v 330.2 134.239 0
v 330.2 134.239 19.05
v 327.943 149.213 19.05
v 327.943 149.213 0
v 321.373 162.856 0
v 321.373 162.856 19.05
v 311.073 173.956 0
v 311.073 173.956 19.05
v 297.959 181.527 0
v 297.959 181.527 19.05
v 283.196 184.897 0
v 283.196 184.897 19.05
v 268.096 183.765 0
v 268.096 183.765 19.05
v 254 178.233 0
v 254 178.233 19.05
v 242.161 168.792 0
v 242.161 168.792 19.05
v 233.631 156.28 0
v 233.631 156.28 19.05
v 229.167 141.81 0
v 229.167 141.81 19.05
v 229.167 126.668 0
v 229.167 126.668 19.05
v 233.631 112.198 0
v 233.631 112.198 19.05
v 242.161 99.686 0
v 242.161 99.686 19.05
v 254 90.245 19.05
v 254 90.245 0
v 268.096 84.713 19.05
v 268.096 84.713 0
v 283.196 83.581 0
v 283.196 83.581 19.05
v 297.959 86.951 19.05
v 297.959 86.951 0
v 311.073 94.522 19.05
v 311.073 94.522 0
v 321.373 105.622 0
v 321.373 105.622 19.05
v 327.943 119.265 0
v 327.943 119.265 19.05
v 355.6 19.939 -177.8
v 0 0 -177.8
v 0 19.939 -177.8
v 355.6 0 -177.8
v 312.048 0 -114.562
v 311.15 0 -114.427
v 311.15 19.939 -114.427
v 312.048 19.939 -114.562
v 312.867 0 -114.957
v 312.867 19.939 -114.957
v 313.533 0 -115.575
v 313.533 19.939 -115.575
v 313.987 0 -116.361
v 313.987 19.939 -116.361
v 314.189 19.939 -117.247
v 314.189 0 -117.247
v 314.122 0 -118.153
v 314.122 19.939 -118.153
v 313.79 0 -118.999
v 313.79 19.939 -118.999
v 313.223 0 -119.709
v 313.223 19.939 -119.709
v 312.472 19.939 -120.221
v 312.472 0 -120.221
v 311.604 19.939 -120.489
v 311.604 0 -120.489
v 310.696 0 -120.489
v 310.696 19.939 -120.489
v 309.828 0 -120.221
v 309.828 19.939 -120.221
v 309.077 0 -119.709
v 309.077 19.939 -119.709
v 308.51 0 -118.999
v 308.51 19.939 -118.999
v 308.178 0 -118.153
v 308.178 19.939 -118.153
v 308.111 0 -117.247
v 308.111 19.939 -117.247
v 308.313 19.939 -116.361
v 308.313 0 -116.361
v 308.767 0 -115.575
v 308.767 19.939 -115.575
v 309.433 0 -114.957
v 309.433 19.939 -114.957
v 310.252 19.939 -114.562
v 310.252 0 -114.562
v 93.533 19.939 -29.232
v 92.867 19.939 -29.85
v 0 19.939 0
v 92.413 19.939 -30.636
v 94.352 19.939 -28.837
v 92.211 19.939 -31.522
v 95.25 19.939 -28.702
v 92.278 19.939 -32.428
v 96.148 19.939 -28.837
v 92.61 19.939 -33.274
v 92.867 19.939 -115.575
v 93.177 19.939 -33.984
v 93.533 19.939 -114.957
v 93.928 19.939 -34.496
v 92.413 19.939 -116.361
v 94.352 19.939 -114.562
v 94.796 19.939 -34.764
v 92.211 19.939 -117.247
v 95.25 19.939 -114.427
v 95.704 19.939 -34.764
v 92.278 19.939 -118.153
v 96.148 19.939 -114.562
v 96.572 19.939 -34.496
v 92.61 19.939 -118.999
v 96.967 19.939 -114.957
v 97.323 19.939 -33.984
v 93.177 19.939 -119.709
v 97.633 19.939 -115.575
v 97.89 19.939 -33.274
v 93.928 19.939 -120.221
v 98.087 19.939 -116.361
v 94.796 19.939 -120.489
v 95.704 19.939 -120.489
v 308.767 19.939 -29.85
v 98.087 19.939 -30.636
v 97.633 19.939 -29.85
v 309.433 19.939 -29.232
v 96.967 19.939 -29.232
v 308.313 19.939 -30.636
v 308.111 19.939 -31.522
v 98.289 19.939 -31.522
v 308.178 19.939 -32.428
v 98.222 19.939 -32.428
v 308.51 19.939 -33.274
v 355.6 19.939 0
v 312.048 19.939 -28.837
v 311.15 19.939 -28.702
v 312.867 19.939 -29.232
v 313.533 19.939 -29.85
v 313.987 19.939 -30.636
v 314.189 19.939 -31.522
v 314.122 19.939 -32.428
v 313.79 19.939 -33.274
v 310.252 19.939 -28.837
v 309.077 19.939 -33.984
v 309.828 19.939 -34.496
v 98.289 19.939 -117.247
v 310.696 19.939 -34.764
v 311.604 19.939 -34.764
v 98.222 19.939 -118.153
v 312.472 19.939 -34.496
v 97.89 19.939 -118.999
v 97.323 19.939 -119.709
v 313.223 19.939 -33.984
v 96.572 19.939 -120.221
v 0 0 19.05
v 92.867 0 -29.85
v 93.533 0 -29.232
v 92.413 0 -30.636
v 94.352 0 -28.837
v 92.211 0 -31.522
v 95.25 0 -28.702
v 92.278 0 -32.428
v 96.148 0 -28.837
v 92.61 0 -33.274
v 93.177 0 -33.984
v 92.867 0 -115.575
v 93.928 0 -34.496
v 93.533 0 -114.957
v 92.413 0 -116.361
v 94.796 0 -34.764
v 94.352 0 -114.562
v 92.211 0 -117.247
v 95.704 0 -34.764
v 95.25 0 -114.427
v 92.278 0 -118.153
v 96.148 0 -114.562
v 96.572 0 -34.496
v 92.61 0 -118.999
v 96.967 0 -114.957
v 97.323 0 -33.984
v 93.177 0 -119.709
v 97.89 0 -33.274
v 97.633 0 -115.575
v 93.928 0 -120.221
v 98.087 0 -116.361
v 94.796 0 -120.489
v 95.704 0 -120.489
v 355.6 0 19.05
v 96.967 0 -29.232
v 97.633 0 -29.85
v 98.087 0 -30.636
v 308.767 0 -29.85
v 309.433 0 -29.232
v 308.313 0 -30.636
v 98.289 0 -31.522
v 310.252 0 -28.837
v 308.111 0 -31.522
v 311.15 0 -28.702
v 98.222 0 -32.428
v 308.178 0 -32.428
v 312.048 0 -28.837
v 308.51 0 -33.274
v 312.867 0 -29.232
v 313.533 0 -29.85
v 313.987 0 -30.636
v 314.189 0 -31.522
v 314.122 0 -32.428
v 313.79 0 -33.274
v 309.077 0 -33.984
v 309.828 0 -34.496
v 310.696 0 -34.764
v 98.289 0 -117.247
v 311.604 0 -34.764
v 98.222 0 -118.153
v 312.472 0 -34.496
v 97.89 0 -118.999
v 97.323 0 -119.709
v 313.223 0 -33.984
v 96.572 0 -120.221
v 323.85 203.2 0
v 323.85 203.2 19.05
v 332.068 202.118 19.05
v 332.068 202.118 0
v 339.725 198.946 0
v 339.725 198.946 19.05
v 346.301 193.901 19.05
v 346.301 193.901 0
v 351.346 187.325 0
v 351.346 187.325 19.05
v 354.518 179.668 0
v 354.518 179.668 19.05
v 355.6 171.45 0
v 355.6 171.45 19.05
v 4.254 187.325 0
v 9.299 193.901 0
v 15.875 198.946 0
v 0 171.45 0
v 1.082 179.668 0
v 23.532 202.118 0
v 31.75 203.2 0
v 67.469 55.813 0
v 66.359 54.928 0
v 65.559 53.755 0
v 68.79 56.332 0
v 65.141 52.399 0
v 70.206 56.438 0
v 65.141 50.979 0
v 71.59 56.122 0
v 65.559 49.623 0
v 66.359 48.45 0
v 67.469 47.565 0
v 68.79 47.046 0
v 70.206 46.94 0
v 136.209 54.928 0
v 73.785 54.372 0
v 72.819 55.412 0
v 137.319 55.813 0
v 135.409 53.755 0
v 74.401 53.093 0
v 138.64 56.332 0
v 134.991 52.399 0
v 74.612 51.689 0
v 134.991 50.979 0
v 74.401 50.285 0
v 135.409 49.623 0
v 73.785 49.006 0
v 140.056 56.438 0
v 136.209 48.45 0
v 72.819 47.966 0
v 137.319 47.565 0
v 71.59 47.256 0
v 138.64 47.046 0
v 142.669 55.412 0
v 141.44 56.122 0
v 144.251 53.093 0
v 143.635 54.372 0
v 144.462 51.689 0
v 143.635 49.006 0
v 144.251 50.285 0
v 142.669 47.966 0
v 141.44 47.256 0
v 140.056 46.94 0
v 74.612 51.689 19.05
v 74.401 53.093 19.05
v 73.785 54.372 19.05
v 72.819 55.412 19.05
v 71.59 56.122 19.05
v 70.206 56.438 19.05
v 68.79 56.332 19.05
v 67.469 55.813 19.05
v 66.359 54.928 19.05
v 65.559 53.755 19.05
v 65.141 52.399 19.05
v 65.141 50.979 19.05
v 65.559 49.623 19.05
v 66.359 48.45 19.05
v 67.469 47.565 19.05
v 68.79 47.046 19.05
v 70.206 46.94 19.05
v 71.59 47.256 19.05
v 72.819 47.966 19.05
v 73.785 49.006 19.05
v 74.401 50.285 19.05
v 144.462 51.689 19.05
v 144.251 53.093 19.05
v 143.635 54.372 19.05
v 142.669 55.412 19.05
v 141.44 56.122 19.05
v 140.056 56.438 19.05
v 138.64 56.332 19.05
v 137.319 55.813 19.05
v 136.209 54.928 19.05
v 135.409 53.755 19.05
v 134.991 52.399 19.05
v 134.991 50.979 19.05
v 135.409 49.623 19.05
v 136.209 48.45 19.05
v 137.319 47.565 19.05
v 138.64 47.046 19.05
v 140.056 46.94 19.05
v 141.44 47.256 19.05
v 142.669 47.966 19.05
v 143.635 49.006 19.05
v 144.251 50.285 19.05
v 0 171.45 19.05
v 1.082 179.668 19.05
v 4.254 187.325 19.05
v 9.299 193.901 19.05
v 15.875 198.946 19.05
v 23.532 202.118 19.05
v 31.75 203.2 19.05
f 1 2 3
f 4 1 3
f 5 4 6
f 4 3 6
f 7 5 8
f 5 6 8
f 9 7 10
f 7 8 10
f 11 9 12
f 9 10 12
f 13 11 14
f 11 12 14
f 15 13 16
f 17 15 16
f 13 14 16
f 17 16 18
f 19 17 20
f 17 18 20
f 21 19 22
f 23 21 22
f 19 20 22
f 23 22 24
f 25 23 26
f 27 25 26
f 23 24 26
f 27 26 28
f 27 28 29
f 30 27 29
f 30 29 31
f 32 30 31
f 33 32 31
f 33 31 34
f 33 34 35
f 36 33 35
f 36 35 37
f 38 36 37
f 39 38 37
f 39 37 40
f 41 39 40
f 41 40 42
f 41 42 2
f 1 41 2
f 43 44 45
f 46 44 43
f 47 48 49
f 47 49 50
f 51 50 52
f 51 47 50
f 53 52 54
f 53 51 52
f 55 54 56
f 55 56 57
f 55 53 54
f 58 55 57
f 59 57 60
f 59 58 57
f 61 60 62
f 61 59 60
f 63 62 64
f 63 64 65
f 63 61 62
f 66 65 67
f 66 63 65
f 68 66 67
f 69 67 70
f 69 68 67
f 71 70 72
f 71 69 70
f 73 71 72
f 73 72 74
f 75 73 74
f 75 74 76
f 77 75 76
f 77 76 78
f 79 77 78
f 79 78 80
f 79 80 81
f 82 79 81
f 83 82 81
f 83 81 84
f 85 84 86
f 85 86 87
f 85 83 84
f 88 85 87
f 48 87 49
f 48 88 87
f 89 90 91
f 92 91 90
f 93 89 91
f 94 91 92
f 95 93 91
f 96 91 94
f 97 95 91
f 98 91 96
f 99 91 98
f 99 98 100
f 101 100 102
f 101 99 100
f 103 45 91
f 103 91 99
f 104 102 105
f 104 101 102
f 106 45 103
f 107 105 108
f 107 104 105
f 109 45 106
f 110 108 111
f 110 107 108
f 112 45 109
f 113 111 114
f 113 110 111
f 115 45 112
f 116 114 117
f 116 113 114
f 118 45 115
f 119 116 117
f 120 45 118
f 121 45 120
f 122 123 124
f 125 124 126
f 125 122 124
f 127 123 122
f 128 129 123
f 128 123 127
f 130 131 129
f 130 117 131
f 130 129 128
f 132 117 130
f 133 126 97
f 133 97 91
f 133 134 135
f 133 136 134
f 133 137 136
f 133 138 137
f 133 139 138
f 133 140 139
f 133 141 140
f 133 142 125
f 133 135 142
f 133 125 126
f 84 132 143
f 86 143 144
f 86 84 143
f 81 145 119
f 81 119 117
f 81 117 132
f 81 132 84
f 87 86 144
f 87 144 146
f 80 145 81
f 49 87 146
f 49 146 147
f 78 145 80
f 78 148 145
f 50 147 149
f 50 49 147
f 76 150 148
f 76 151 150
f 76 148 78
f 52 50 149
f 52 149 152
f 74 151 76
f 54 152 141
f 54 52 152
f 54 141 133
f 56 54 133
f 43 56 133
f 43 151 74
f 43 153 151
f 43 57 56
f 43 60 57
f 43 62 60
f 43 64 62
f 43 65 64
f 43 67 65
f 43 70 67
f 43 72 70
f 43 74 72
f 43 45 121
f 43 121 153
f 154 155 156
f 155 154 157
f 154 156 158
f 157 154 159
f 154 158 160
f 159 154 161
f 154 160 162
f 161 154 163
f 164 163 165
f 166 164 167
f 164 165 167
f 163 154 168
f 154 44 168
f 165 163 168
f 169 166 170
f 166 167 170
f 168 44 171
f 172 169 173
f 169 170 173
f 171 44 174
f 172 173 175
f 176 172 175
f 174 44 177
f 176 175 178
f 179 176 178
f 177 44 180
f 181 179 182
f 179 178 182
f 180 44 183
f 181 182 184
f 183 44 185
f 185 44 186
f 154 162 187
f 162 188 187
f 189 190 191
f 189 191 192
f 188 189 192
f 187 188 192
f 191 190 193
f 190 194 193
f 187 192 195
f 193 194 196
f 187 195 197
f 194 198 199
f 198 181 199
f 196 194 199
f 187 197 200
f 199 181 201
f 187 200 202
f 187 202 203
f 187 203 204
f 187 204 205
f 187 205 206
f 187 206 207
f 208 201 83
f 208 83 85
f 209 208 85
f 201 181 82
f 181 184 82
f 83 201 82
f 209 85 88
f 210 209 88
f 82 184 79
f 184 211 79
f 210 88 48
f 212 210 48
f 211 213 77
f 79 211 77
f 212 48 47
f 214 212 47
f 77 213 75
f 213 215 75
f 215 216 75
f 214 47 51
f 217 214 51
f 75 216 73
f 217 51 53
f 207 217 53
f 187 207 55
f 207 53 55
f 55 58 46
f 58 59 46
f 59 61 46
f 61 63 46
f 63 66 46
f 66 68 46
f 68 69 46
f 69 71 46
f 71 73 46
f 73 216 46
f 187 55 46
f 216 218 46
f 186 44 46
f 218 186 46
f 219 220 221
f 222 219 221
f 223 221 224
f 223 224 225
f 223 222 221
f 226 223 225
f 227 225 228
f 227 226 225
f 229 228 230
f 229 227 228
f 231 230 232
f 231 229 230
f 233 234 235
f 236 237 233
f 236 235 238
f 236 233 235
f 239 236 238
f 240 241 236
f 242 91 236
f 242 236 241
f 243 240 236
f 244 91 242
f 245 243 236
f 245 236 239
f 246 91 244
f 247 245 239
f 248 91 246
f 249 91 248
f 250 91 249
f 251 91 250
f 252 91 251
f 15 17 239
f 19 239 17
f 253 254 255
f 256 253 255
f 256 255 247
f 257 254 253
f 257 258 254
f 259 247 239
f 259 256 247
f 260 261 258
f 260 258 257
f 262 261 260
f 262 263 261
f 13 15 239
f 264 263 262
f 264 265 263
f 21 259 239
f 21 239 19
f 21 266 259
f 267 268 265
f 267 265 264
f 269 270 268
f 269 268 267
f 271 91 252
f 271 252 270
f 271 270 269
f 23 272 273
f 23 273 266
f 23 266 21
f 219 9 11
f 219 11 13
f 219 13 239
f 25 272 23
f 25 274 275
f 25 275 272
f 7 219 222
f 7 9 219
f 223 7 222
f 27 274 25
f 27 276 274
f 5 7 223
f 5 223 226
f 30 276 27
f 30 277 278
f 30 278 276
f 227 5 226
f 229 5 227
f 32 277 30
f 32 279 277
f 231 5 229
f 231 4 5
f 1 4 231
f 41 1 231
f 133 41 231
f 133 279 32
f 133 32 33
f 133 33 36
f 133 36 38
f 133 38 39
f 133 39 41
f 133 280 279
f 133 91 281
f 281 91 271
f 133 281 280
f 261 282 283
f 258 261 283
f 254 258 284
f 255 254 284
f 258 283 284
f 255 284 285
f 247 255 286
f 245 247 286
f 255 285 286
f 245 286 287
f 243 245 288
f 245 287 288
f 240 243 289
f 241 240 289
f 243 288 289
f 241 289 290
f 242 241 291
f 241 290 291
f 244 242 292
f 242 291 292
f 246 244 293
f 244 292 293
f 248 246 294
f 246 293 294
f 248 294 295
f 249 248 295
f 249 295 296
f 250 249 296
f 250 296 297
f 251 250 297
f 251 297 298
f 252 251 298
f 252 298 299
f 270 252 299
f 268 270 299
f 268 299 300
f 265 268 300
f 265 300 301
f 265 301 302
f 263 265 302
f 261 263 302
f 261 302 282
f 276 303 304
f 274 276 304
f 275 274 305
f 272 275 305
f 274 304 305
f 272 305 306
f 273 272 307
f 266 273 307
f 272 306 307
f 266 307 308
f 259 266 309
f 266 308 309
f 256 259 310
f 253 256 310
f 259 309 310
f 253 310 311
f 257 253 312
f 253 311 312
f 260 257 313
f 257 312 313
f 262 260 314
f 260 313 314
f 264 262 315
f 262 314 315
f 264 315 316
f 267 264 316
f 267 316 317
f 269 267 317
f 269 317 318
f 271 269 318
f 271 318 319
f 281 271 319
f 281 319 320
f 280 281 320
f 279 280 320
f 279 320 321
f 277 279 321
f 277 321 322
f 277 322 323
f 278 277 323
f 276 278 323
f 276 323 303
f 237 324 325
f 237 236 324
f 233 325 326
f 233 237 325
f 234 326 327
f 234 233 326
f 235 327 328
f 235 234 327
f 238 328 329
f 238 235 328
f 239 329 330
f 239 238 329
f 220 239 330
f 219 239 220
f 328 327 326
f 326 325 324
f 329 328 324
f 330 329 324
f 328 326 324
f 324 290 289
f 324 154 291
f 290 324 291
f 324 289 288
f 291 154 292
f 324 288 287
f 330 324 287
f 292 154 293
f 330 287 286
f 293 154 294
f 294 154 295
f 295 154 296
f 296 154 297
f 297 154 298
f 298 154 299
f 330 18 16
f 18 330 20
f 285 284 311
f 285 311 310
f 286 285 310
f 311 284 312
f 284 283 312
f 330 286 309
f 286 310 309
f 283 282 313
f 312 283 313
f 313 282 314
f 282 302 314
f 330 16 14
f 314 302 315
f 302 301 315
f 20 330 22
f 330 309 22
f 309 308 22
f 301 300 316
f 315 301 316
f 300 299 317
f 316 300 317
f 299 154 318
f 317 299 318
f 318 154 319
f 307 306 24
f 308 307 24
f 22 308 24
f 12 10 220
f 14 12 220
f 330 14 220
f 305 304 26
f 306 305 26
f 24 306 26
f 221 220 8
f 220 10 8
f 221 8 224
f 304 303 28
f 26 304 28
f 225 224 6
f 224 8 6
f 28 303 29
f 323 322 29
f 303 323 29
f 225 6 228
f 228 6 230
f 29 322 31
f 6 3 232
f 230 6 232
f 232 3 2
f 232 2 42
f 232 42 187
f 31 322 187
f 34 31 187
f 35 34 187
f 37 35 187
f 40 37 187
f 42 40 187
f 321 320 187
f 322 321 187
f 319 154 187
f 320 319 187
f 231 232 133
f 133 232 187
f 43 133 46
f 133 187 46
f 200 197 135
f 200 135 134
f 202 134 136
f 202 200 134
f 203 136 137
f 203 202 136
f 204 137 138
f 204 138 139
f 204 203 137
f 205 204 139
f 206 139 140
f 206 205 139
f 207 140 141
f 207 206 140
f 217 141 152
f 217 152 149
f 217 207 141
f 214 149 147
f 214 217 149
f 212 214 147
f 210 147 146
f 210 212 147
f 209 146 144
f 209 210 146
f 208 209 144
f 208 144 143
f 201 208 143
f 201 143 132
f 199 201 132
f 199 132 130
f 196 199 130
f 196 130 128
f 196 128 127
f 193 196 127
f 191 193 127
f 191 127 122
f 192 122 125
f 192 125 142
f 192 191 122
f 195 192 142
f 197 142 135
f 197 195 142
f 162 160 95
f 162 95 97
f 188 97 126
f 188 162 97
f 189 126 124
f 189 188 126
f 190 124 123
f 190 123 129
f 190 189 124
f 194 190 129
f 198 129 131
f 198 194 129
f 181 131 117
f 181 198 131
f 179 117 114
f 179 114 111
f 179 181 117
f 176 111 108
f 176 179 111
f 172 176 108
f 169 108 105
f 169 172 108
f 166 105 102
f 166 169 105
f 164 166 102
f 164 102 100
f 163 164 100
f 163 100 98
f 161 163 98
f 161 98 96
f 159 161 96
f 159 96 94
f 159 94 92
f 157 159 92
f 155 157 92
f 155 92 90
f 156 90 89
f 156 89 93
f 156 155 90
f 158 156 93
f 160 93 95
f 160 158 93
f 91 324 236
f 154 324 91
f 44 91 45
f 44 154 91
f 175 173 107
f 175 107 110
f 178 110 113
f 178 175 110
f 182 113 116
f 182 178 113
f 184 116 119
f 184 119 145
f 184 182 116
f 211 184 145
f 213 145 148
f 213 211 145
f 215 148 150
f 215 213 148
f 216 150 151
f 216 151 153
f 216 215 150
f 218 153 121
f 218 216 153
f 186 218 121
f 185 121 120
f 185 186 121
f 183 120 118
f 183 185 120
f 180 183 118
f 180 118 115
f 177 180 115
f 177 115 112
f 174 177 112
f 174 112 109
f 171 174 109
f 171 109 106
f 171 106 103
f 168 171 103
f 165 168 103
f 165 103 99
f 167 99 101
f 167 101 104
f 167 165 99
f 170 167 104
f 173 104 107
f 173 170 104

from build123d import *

# Parameters (mm, degrees)
SKETCH1_W           = 355.6
SKETCH1_H           = 177.8
SKETCH1_R           = 3.048
BOSS_EXTRUDE1_DEPTH = 19.939
SKETCH2_W           = 355.6
SKETCH2_H           = 19.05
BOSS_EXTRUDE2_DEPTH = 203.2
SKETCH3_R           = 50.8
SKETCH3_R_2         = 4.7625
CUT_EXTRUDE1_DEPTH  = 455.413382835
FILLET1_R           = 31.75


with BuildPart() as part:
    # Sketch1 → Boss-Extrude1 (new body)
    with BuildSketch(Plane(origin=(0, 0, 0), x_dir=(1, 0, 0), z_dir=(0, 1, 0))):
        with Locations((177.8, 88.9)):
            Rectangle(SKETCH1_W, SKETCH1_H)
        with Locations(Location((95.25, 117.475, 0), (0, 0, 270))):
            Circle(SKETCH1_R, mode=Mode.SUBTRACT)
        with Locations(Location((311.15, 117.475, 0), (0, 0, 270))):
            Circle(SKETCH1_R, mode=Mode.SUBTRACT)
        with Locations(Location((311.15, 31.75, 0), (0, 0, 270))):
            Circle(SKETCH1_R, mode=Mode.SUBTRACT)
        with Locations(Location((95.25, 31.75, 0), (0, 0, 270))):
            Circle(SKETCH1_R, mode=Mode.SUBTRACT)
    extrude(amount=BOSS_EXTRUDE1_DEPTH)

    # Sketch2 → Boss-Extrude2 (add)
    with BuildSketch(Plane(origin=(0, 0, 0), x_dir=(1, 0, 0), z_dir=(0, 1, 0))):
        with Locations((177.8, -9.525)):
            Rectangle(SKETCH2_W, SKETCH2_H)
    extrude(amount=BOSS_EXTRUDE2_DEPTH)

    # Sketch3 → Cut-Extrude1 (cut, through all)
    with BuildSketch(Plane.XY.offset(19.05)):
        with Locations((279.4, 134.239)):
            Circle(SKETCH3_R)
        with Locations((69.85, 51.689)):
            Circle(SKETCH3_R_2)
        with Locations((139.7, 51.689)):
            Circle(SKETCH3_R_2)
    extrude(amount=-CUT_EXTRUDE1_DEPTH, mode=Mode.SUBTRACT)

    # Fillet1
    fillet1_edges = [part.edges().sort_by_distance(p)[0] for p in [
        (355.6, 203.2, 9.525),
        (0, 203.2, 9.525),
    ]]
    fillet(fillet1_edges, radius=FILLET1_R)


solid = part.part
